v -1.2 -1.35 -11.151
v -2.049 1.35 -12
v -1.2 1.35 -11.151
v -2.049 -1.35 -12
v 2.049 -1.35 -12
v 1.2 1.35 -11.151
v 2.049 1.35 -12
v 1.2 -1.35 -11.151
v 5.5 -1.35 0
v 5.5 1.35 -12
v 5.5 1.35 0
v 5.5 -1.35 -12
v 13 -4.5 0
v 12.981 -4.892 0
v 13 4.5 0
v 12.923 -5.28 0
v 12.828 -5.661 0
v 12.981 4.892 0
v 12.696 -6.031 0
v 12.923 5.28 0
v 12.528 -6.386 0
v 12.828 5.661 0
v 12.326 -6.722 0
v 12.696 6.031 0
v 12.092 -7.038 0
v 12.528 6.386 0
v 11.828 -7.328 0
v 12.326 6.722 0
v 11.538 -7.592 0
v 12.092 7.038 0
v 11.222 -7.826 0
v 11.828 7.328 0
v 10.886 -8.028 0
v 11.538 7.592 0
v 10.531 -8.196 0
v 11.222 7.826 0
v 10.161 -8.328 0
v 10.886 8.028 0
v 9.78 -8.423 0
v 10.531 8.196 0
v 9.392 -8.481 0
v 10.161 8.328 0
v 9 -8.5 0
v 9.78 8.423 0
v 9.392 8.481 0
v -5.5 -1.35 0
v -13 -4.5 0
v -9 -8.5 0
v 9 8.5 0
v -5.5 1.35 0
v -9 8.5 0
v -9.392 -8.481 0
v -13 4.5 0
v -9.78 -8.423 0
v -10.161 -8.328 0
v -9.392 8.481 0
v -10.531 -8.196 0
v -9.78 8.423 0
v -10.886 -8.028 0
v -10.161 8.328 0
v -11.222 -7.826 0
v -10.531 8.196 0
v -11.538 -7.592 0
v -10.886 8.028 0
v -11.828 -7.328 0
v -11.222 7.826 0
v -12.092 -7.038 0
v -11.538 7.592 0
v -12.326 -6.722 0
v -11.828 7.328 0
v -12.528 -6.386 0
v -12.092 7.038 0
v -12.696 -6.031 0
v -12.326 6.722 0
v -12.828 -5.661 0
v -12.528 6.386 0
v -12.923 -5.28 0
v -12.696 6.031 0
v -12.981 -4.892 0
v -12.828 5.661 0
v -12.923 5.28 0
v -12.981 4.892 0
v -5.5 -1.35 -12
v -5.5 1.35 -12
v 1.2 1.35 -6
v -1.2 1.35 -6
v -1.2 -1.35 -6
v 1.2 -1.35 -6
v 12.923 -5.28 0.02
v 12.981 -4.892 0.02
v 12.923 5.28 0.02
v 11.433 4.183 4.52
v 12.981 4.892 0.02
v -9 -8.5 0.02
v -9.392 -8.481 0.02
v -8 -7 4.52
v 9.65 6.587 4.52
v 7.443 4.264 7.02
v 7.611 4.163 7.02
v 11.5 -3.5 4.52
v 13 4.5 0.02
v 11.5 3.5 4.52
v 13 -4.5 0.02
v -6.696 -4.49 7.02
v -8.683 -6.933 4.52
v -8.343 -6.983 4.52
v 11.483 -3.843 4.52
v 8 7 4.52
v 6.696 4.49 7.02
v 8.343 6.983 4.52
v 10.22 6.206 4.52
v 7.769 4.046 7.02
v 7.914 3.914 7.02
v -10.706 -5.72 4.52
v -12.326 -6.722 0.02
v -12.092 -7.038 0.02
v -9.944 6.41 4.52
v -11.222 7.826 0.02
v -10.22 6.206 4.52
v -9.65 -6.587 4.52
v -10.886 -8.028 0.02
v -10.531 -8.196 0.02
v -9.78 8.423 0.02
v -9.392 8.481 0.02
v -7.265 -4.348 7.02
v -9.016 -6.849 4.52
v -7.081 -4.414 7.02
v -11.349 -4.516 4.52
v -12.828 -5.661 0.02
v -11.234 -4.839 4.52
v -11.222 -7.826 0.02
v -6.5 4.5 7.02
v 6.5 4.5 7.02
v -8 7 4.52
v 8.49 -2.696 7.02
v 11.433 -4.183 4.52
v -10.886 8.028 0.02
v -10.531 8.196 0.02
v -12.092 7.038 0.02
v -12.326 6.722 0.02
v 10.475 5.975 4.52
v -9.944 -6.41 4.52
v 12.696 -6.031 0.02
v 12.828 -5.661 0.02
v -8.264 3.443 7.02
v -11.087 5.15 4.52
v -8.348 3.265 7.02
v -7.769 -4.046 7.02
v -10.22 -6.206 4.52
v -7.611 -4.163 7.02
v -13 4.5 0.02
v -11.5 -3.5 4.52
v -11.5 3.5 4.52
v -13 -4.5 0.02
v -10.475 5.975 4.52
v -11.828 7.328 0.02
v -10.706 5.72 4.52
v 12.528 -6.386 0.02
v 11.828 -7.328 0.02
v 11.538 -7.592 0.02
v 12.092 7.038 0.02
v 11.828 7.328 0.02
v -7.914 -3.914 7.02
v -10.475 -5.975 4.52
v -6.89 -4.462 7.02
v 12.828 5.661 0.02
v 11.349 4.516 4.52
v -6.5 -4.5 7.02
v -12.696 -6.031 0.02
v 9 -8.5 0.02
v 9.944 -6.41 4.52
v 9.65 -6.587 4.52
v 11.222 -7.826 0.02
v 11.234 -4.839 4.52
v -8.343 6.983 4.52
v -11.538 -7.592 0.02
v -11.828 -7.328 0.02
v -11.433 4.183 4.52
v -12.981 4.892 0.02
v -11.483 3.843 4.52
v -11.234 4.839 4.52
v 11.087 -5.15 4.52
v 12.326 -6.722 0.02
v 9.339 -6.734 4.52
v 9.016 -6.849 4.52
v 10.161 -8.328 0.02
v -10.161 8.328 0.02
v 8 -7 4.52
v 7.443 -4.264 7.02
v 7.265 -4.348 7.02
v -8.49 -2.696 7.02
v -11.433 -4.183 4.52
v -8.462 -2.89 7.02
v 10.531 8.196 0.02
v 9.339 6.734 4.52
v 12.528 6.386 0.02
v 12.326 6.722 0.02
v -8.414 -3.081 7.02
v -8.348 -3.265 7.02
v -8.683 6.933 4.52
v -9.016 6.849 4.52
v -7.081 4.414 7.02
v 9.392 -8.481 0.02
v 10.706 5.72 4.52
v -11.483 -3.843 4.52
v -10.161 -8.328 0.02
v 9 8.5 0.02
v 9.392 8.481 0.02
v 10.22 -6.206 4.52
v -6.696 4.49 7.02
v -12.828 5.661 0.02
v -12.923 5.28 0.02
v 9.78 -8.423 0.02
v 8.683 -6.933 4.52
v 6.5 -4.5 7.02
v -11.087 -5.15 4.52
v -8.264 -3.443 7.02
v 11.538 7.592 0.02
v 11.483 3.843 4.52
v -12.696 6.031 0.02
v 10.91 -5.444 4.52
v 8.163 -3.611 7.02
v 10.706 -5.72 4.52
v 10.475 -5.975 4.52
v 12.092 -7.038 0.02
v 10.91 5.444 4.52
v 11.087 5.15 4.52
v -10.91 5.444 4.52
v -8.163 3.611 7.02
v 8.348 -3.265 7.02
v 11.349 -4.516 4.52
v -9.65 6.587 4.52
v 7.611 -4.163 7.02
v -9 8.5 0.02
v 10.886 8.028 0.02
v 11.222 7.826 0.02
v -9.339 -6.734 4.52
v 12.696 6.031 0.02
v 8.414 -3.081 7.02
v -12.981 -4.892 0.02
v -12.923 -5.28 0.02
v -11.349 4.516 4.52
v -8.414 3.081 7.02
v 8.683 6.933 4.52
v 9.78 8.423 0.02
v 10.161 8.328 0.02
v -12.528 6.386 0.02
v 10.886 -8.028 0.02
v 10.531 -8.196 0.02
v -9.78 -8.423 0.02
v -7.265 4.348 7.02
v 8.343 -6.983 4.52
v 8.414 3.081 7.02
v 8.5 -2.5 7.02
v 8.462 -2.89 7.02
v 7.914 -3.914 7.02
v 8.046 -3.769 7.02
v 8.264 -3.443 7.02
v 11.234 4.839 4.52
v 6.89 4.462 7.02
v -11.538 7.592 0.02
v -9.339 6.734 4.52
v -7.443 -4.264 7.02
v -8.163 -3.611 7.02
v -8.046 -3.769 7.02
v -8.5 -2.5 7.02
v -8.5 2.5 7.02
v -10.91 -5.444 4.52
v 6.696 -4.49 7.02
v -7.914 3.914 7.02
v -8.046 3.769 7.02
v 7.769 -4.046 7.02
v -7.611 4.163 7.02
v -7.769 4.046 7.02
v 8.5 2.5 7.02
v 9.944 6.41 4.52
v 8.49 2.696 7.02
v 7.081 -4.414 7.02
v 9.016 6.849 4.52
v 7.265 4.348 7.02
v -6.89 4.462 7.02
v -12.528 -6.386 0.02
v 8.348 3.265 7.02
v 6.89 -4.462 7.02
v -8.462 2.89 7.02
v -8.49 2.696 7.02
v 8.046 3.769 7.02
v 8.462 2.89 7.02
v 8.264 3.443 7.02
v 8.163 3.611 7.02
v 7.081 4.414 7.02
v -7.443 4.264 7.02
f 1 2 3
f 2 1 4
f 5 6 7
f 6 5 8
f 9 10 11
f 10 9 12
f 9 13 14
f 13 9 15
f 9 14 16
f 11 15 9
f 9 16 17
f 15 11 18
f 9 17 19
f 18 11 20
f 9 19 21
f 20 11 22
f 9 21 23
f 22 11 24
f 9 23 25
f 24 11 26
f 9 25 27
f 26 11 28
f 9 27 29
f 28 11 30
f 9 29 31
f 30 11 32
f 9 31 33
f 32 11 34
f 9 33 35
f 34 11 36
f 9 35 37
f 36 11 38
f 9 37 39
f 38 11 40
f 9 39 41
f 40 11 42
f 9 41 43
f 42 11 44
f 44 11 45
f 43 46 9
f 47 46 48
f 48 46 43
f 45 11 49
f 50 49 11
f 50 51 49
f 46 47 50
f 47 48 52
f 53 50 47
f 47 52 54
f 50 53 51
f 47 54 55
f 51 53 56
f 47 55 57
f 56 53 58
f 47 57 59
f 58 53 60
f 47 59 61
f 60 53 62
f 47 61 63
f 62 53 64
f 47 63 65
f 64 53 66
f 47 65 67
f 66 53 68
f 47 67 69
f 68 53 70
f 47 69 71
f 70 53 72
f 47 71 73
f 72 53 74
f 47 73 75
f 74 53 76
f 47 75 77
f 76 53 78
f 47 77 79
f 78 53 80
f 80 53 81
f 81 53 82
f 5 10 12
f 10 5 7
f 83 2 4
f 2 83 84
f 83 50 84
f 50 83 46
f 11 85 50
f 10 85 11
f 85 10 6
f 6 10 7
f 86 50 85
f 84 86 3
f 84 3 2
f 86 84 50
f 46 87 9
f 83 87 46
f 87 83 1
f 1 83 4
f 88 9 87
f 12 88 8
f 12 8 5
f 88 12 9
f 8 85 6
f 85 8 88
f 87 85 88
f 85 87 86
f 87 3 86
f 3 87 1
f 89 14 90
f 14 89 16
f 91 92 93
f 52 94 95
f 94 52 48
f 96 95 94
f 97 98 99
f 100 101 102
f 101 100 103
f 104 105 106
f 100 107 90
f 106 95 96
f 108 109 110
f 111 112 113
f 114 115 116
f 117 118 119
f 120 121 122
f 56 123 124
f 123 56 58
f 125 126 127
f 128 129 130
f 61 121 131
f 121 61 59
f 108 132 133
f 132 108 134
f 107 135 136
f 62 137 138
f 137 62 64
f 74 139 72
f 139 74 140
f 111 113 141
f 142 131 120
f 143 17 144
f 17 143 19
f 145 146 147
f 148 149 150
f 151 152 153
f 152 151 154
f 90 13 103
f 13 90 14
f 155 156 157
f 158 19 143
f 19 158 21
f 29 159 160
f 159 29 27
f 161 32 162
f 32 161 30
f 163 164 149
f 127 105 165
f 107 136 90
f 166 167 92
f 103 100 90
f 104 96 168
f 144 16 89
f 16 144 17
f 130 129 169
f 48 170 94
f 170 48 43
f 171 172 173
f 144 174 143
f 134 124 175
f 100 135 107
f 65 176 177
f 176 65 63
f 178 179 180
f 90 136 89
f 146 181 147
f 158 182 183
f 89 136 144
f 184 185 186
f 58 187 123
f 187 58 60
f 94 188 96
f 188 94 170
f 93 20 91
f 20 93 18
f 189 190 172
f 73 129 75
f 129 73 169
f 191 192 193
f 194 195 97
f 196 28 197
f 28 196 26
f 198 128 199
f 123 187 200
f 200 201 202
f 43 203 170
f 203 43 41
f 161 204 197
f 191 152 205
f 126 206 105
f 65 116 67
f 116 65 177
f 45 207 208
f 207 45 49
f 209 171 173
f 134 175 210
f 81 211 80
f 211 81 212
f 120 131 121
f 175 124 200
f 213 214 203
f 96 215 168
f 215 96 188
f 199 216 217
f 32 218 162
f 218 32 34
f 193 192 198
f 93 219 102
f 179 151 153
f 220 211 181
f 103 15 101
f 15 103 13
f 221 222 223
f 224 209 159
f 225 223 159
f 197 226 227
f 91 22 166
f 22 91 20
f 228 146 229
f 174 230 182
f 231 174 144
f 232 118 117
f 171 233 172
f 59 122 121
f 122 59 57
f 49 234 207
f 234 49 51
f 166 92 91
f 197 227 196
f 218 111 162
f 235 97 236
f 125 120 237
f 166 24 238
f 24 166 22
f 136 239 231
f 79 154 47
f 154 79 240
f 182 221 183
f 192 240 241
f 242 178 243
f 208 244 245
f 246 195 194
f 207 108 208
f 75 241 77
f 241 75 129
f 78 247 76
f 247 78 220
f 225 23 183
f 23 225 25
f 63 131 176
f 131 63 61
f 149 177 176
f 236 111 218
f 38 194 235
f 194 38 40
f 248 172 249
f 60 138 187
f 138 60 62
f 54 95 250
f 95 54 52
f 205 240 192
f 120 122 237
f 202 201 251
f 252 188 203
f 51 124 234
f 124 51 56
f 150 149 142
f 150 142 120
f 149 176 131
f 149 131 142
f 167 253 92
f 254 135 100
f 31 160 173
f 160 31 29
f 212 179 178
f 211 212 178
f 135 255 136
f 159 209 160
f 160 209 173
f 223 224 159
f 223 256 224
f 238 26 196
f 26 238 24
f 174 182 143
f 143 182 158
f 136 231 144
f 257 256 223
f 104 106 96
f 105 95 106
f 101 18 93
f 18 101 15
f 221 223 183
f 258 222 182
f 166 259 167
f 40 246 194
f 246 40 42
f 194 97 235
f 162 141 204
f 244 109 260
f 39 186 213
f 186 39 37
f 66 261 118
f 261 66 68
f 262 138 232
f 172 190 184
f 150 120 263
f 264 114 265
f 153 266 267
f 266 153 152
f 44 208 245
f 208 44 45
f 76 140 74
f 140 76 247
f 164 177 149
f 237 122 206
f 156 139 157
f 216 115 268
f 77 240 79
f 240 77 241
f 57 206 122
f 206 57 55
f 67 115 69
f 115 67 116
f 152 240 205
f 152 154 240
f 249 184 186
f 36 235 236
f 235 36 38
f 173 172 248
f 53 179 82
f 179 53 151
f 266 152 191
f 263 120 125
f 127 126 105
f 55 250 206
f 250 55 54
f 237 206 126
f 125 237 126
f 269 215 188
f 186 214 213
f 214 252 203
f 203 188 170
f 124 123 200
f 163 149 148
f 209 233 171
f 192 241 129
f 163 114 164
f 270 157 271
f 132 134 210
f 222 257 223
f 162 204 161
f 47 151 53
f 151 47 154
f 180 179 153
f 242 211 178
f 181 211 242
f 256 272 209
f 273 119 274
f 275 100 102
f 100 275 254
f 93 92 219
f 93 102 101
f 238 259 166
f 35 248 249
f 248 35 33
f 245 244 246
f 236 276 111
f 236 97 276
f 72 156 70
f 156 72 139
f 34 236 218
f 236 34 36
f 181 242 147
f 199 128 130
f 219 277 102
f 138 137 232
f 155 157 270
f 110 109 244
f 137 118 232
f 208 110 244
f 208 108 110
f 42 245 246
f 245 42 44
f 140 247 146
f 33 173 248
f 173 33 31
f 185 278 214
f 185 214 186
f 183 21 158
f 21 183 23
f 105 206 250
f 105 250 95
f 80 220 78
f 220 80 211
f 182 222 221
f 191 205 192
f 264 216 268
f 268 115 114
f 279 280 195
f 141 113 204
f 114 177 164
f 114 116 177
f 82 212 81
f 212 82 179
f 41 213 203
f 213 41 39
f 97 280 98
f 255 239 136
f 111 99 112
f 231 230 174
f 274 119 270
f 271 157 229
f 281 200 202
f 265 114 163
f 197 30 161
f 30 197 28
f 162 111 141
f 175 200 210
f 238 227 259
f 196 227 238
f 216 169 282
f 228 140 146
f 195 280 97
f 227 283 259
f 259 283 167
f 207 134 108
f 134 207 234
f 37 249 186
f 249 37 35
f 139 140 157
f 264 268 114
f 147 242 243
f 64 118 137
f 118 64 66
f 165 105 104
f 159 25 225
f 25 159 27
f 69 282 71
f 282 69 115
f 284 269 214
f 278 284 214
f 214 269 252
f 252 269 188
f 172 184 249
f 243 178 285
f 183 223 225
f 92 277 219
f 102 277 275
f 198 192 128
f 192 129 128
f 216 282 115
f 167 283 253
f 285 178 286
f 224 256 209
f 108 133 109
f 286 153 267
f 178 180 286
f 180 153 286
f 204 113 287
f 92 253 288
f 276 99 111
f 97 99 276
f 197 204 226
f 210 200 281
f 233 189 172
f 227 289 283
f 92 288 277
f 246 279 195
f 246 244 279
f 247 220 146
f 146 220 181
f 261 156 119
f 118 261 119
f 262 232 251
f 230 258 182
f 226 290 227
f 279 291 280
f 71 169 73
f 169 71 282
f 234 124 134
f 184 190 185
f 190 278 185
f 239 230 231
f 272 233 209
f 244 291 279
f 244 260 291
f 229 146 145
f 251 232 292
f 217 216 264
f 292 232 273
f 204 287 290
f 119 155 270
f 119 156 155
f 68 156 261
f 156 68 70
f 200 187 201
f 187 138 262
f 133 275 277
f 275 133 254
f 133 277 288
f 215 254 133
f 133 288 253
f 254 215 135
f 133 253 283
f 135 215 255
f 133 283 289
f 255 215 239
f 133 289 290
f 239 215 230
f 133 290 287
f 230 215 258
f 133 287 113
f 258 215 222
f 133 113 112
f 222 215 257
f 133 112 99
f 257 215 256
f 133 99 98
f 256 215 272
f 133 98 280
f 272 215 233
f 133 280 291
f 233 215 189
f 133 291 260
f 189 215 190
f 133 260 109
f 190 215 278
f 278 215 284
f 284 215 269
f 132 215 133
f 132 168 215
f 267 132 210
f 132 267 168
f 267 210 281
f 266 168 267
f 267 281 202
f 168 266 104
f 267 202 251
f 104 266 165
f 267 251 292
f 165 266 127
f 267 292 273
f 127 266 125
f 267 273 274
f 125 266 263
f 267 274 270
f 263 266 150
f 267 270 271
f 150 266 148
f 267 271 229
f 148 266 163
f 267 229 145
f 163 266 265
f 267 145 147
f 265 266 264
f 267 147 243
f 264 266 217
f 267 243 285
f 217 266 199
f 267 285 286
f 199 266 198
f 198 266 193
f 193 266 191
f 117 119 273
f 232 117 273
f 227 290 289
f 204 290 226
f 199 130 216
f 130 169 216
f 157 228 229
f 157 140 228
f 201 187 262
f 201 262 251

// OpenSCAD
// file: ../../sorgenti/parametri.scad
// ============================================================
// parametri.scad — tutte le misure del progetto, in millimetri
// ------------------------------------------------------------
// Unica fonte di verità per la geometria: se cambia un
// componente, si cambia QUI e si rigenerano gli STL con
//   ./modelli-3d/genera-stl.sh
//
// Le misure marcate [VERIFICARE] vanno ricontrollate col
// calibro quando arrivano i pezzi, prima di stampare il case.
// ============================================================

// Risoluzione delle curve: 48 per lavorare, 96 per gli STL finali.
RISOLUZIONE = 64;

// ---------- Tolleranze di stampa (Kobra S2 / S3 Max, ugello 0,4) ----------
GIOCO        = 0.35;  // gioco fra due pezzi stampati che si accoppiano
GIOCO_FORO   = 0.25;  // sovramisura dei fori per i componenti
PARETE_MIN   = 1.6;   // spessore minimo di una parete portante (4 linee)

// ---------- Scocca ----------
// Scocca = pareti + coperchio in UN SOLO pezzo (si stampa capovolta).
// Il fondo è una piastra separata, avvitata dall'esterno.
BOX_X        = 130;   // larghezza
BOX_Y        = 130;   // profondità
BOX_Z        = 100;   // altezza totale, fondo compreso
PARETE       = 2.4;   // spessore pareti (3 perimetri a 0,8)
TOP_SP       = 5.0;   // spessore del coperchio (serve per il dado del tasto arcade)
RAGGIO_VERT  = 8;     // raggio degli angoli verticali (spec: >= 5)
RAGGIO_TOP   = 3;     // raccordo del bordo superiore
FONDO_SP     = 3.0;   // spessore della piastra di fondo
FONDO_INCASSO = FONDO_SP;  // il fondo è incassato e a filo con le pareti

// ---------- Zona NFC sul coperchio ----------
NFC_D        = 62;    // diametro dello scasso di appoggio
NFC_PROF     = 3.0;   // profondità dello scasso
NFC_X        = 0;     // posizione del centro (X=0 = centro scatola)
NFC_Y        = 28;    // spostato verso il retro, davanti ci stanno i comandi
NFC_TACCA_D  = 14;    // tacche laterali per sollevare il vinile con un dito
// Fondo dello scasso = TOP_SP - NFC_PROF = 2,0 mm (limite di specifica)

// ---------- Cursore volume (potenziometro a slitta B10K) ----------
CURSORE_CORSA   = 60;    // corsa utile [VERIFICARE sul pezzo]
CURSORE_LUNG    = 75;    // lunghezza totale del corpo [VERIFICARE]
CURSORE_LARG    = 9;     // larghezza del corpo [VERIFICARE]
CURSORE_ALT     = 9;     // altezza del corpo sopra il PCB [VERIFICARE]
CURSORE_LEVA_X  = 2.0;   // spessore della levetta
CURSORE_LEVA_Y  = 6.0;   // larghezza della levetta
CURSORE_FESSURA_W = 3.2; // larghezza della fessura nel coperchio
CURSORE_Y       = -16;   // posizione sul coperchio
CURSORE_Z_SOTTO = 7;     // quota del corpo del potenziometro sotto la faccia interna

// ---------- Tasti arcade ----------
// "30 mm" è il diametro del cappuccio: il foro di montaggio è 28 mm
// sui modelli con ghiera filettata. [VERIFICARE col pezzo in mano]
TASTO_FORO   = 28.0;
TASTO_CAPPUCCIO = 33;
TASTO_X      = 35;    // centri a +/- 35 -> 70 mm fra i centri
TASTO_Y      = -42;

// ---------- Display e-paper 2,13" (Waveshare 250x122) ----------
EPD_PCB_X    = 59.2;  // [VERIFICARE]
EPD_PCB_Z    = 29.2;  // [VERIFICARE]
EPD_PCB_SP   = 1.2;   // spessore del modulo senza componenti
EPD_FIN_X    = 50;    // finestra visibile (area attiva 48,55 x 23,7)
EPD_FIN_Z    = 25.5;
EPD_Z        = 76;    // quota del centro finestra sulla parete frontale
EPD_PARETE   = 1.2;   // parete sottile davanti al display (0 = finestra aperta)

// ---------- Altoparlante ----------
ALT_D        = 40;    // diametro esterno [VERIFICARE]
ALT_ALT      = 6;     // altezza col magnete [VERIFICARE]
ALT_Z        = 32;    // quota del centro sulla parete frontale
ALT_GRIGLIA_D   = 1.8; // fori della griglia (spec: <= 2 mm)
ALT_CAMERA_PROF = 12;  // profondità della camera chiusa dietro il cono
ALT_TUBO_OD     = 52;  // diametro esterno del tubo portaltoparlante
ALT_TUBO_LUNG   = 12;  // lunghezza del tubo verso l'interno
ALT_CAMERA_SEDE = 46.4;// controforo in cui si innesta la camera

// ---------- Lettore PN5180 ----------
// Fissato sotto il coperchio con biadesivo + nervature di contenimento.
// Le nervature sono aperte su un lato: il modulo entra a scorrere.
PN_X         = 58;    // ingombro del modulo, lato X [VERIFICARE]
PN_Y         = 47;    // ingombro del modulo, lato Y [VERIFICARE]
PN_ALT       = 8;     // altezza totale coi componenti [VERIFICARE]

// ---------- Retro: USB-C e microSD ----------
USB_X        = -28;   // posizione del centro sulla parete di fondo
USB_Z        = 18;
USB_W        = 11.0;  // foro per il connettore USB-C del TP4056
USB_H        = 6.0;
SD_X         = 28;
SD_Z         = 18;
SD_W         = 14.0;  // fessura di inserimento della microSD
SD_H         = 3.4;

// ---------- Fondo: interruttore, tasto genitori, vano batteria ----------
SW_X         = -40;   // interruttore a slitta da pannello
SW_Y         = -53;
SW_FORO_X    = 13.0;  // [VERIFICARE: SS12D00 o simile]
SW_FORO_Y    = 8.0;
SW_VITI      = 19.5;  // distanza fra le due viti di fissaggio
SW_INCASSO   = 1.6;   // incasso per non sporgere dal fondo

GEN_X        = 40;    // tasto genitori (tattile 6 mm), incassato
GEN_Y        = -53;
GEN_FORO_D   = 6.0;   // passa un polpastrello adulto, non la mano di un bimbo
GEN_POZZO_D  = 11;    // pozzetto di incasso
GEN_POZZO_H  = 1.8;

// Portabatteria con l'asse lungo su Y, sul lato destro: la basetta
// millefori gli passa sopra senza toccarlo.
BATT_HOLDER_X = 24;   // larghezza [VERIFICARE]
BATT_HOLDER_Y = 78;   // lunghezza [VERIFICARE]
BATT_HOLDER_Z = 20;
BATT_X        = 24;   // centro del vano batteria
BATT_Y        = 0;
SPORT_X       = 26;   // apertura dello sportellino batteria
SPORT_Y       = 72;
SPORT_PIASTRA_X = 40; // piastrina dello sportellino
SPORT_PIASTRA_Y = 82;
SPORT_SP      = 2.5;  // spessore dello sportellino
SPORT_RABBET  = 1.2;  // incasso dello sportellino (resta a filo)
SPORT_VITI_DX = 14;   // viti dello sportellino, scostamento da BATT_X
SPORT_VITI_DY = 36;
AUTOFIL_D     = 2.1;  // preforo per vite autofilettante M2,5 nel PETG

// ---------- Viti e inserti ----------
VITE_D       = 2.5;        // M2,5
VITE_FORO    = 2.8;        // passaggio della vite
VITE_TESTA_D = 5.0;        // svasatura della testa
INSERTO_D    = 3.6;        // inserto a caldo M2,5 [VERIFICARE col lotto]
INSERTO_H    = 5.0;
BOSS_D       = 7.5;        // diametro del pilastrino che ospita l'inserto
BOSS_OFF     = 6;          // distanza del pilastrino dalla parete interna

// ---------- Elettronica interna ----------
MILLEFORI_X  = 90;    // basetta millefori (90 x 70)
MILLEFORI_Y  = 70;
MILLEFORI_Z  = 28;    // quota della basetta sopra il fondo
MILLEFORI_SP = 1.6;
MILLEFORI_VITI_X = 41; // colonnine di sostegno
MILLEFORI_VITI_Y = 31;

// ---------- Statuine ----------
ST_BASE_D    = 40;    // cilindro di base
ST_BASE_H    = 8;
ST_TAG_D     = 25;    // tag NTAG213 adesivo
ST_TAG_SEDE_D = 26.4; // sede del tag, con gioco
ST_TAG_SEDE_H = 1.0;  // profondità della sede
ST_TAG_FONDO = 1.0;   // spessore sotto il tag (spec: 1 mm dal fondo)
ST_SMUSSO    = 1.5;   // smusso del bordo della base

// ---------- Vinili ----------
VIN_D        = 60;
VIN_H        = 4;
VIN_SOLCO_H  = 0.4;   // rilievo dei solchi
VIN_ETICH_D  = 24;    // etichetta centrale
VIN_RAGGIO   = 1.2;   // raccordo del bordo

// ---------- Calibro parti piccole (EN 71-1) ----------
CAL_D        = 31.7;
CAL_H_MIN    = 25.4;
CAL_H_MAX    = 57.1;
// file: ../../sorgenti/libreria.scad
// ============================================================
// libreria.scad — forme di base riusate da tutti i pezzi
// ============================================================
include <parametri.scad>

$fn = RISOLUZIONE;

// Prisma a sezione rettangolare con angoli arrotondati.
module piastra(x, y, h, r) {
    linear_extrude(height = h)
        offset(r = r) square([x - 2*r, y - 2*r], center = true);
}

// Scatola piena con angoli verticali arrotondati (rv) e bordo
// superiore raccordato (rt). Il raccordo è approssimato a gradini
// uniti con hull(): resta liscio e si stampa senza supporti.
module scatola_arrotondata(x, y, z, rv, rt, passi = 12) {
    union() {
        piastra(x, y, z - rt, rv);
        for (i = [0 : passi - 1]) {
            a0 = 90 * i / passi;
            a1 = 90 * (i + 1) / passi;
            k0 = rt * (1 - cos(a0));  k1 = rt * (1 - cos(a1));
            h0 = rt * sin(a0);        h1 = rt * sin(a1);
            hull() {
                translate([0, 0, z - rt + h0])
                    piastra(x - 2*k0, y - 2*k0, 0.02, max(rv - k0, 0.6));
                translate([0, 0, z - rt + h1])
                    piastra(x - 2*k1, y - 2*k1, 0.02, max(rv - k1, 0.6));
            }
        }
    }
}

// Foro di passaggio per vite con svasatura della testa (testa in basso,
// si avvita dal basso verso l'alto).
module foro_svasato(h = 10, d = VITE_FORO, testa_d = VITE_TESTA_D, testa_h = 1.6) {
    translate([0, 0, -0.1]) cylinder(h = h + 0.2, d = d);
    translate([0, 0, -0.1]) cylinder(h = testa_h + 0.1, d1 = testa_d, d2 = d);
}

// Pilastrino con sede per inserto a caldo M2,5 (si inserisce dal basso).
module boss_inserto(h = 12, d = BOSS_D) {
    difference() {
        cylinder(h = h, d = d);
        translate([0, 0, -0.1]) cylinder(h = INSERTO_H + 0.1, d = INSERTO_D);
        // scarico sopra l'inserto, per la punta della vite
        translate([0, 0, INSERTO_H]) cylinder(h = h, d = VITE_D + 0.4);
    }
}

// Griglia di fori a nido d'ape dentro un cerchio di diametro d_area.
module griglia_tonda(d_area, spessore, d_foro = ALT_GRIGLIA_D, passo = 3.2) {
    n = ceil(d_area / passo) + 2;
    for (i = [-n : n], j = [-n : n]) {
        x = i * passo + (abs(j) % 2) * passo / 2;
        y = j * passo * 0.866;
        if (sqrt(x*x + y*y) <= (d_area - d_foro) / 2)
            translate([x, y, -0.1]) cylinder(h = spessore + 0.2, d = d_foro);
    }
}

// Fessura allungata (slot) con estremi arrotondati, asse X.
module fessura(lung, larg, h) {
    hull() {
        translate([-(lung - larg)/2, 0, 0]) cylinder(h = h, d = larg);
        translate([ (lung - larg)/2, 0, 0]) cylinder(h = h, d = larg);
    }
}

// Scritta in rilievo (per i provini e le etichette).
module scritta(t, dim = 6, alt = 0.6) {
    linear_extrude(height = alt)
        text(t, size = dim, halign = "center", valign = "center",
             font = "Helvetica:style=Bold");
}

// Freccia piena, punta verso +X, usata per le icone dei tasti.
module freccia(lung = 16, larg = 14, alt = 0.8) {
    gambo = larg / 5;          // mezza larghezza del gambo
    testa = lung * 0.45;       // lunghezza della punta
    linear_extrude(height = alt)
        polygon([[-lung/2, -gambo], [lung/2 - testa, -gambo],
                 [lung/2 - testa, -larg/2], [lung/2, 0],
                 [lung/2 - testa, larg/2], [lung/2 - testa, gambo],
                 [-lung/2, gambo]]);
}

// Icona "volume": tre barrette crescenti, asse X.
module icona_volume(n = 3, alt = 0.8, passo = 3.2, base = 2.0, cresc = 1.6) {
    for (i = [0 : n - 1])
        translate([i * passo, 0, 0])
            linear_extrude(height = alt)
                square([1.8, base + i * cresc], center = true);
}

// Cava a sezione rettangolare arrotondata, asse di estrusione Y.
// Utile per finestre e fessure nelle pareti verticali.
module cava_y(x, z, prof, r = 1.5) {
    rotate([90, 0, 0])
        linear_extrude(height = prof, center = true)
            offset(r = r) square([x - 2*r, z - 2*r], center = true);
}

// Pilastrino che parte dal piano del fondo e ospita un inserto a caldo
// (inserito dal basso). La punta conica in alto lo rende stampabile
// anche a scatola capovolta.
module boss_fondo(h = 12) {
    union() {
        difference() {
            cylinder(h = h, d = BOSS_D);
            translate([0, 0, -0.1]) cylinder(h = INSERTO_H + 0.1, d = INSERTO_D);
            translate([0, 0, INSERTO_H]) cylinder(h = h, d = VITE_D + 0.6);
        }
        translate([0, 0, h]) cylinder(h = BOSS_D/2, d1 = BOSS_D, d2 = 0.4);
    }
}

// Pilastrino appeso al soffitto (coperchio): l'inserto entra dal basso.
module boss_soffitto(h = 7) {
    difference() {
        translate([0, 0, -h]) cylinder(h = h, d = BOSS_D);
        translate([0, 0, -h - 0.1]) cylinder(h = INSERTO_H + 0.1, d = INSERTO_D);
    }
}
// main file
// ============================================================
// pomello-cursore.scad — pomello del volume
// ------------------------------------------------------------
// Il pomello attraversa una fessura di soli 3,2 mm: una lama
// scende fino al potenziometro e due gambette stringono la
// levetta. Così la fessura resta stretta (briciole) e il
// pomello resta largo (mano di un bambino).
//
// Dopo aver misurato il potenziometro vero, controllare
// CURSORE_LEVA_X / CURSORE_LEVA_Y in parametri.scad e
// ristampare: è un pezzo da 10 minuti.
//
// STAMPA: appoggiato su un fianco (faccia Y sul piano),
// nessun supporto: le gambette vengono più robuste.
// ============================================================
include <../../sorgenti/libreria.scad>

pomello();

POM_X  = 26;                          // lunghezza del cappello
POM_Y  = 17;                          // larghezza del cappello
POM_H  = 7;                           // altezza del cappello
LAMA_X = 11;
LAMA_Y = CURSORE_FESSURA_W - 0.5;     // passa nella fessura con gioco
LAMA_H = TOP_SP + CURSORE_Z_SOTTO;    // dal piano del coperchio al corpo
PRESA_H = 6;                          // quanto scende la forcella sulla levetta

module pomello() {
    union() {
        cappello();
        lama();
    }
}

// Cappello bombato, comodo da spingere con un dito o col palmo.
module cappello() {
    hull() {
        piastra(POM_X, POM_Y, 0.02, 4);
        translate([0, 0, POM_H - 2.5]) piastra(POM_X - 3, POM_Y - 3, 0.02, 3.5);
        translate([0, 0, POM_H])       piastra(POM_X - 9, POM_Y - 8, 0.02, 2);
    }
}

// Lama forcellata: scende nella fessura e abbraccia la levetta.
module lama() {
    translate([0, 0, -LAMA_H + LAMA_H/2])
        difference() {
            cube([LAMA_X, LAMA_Y, LAMA_H], center = true);
            // intaglio centrale: le due gambette stringono la levetta
            translate([0, 0, -(LAMA_H - PRESA_H)/2 - 0.1])
                cube([CURSORE_LEVA_X + 0.4, LAMA_Y + 1, PRESA_H + 0.2],
                     center = true);
            // inviti sulle punte, per infilarlo senza forzare
            for (sx = [-1, 1])
                translate([sx * (CURSORE_LEVA_X/2 + 0.2), 0, -LAMA_H/2])
                    rotate([0, sx * 45, 0])
                        cube([1.2, LAMA_Y + 1, 1.2], center = true);
        }
}
